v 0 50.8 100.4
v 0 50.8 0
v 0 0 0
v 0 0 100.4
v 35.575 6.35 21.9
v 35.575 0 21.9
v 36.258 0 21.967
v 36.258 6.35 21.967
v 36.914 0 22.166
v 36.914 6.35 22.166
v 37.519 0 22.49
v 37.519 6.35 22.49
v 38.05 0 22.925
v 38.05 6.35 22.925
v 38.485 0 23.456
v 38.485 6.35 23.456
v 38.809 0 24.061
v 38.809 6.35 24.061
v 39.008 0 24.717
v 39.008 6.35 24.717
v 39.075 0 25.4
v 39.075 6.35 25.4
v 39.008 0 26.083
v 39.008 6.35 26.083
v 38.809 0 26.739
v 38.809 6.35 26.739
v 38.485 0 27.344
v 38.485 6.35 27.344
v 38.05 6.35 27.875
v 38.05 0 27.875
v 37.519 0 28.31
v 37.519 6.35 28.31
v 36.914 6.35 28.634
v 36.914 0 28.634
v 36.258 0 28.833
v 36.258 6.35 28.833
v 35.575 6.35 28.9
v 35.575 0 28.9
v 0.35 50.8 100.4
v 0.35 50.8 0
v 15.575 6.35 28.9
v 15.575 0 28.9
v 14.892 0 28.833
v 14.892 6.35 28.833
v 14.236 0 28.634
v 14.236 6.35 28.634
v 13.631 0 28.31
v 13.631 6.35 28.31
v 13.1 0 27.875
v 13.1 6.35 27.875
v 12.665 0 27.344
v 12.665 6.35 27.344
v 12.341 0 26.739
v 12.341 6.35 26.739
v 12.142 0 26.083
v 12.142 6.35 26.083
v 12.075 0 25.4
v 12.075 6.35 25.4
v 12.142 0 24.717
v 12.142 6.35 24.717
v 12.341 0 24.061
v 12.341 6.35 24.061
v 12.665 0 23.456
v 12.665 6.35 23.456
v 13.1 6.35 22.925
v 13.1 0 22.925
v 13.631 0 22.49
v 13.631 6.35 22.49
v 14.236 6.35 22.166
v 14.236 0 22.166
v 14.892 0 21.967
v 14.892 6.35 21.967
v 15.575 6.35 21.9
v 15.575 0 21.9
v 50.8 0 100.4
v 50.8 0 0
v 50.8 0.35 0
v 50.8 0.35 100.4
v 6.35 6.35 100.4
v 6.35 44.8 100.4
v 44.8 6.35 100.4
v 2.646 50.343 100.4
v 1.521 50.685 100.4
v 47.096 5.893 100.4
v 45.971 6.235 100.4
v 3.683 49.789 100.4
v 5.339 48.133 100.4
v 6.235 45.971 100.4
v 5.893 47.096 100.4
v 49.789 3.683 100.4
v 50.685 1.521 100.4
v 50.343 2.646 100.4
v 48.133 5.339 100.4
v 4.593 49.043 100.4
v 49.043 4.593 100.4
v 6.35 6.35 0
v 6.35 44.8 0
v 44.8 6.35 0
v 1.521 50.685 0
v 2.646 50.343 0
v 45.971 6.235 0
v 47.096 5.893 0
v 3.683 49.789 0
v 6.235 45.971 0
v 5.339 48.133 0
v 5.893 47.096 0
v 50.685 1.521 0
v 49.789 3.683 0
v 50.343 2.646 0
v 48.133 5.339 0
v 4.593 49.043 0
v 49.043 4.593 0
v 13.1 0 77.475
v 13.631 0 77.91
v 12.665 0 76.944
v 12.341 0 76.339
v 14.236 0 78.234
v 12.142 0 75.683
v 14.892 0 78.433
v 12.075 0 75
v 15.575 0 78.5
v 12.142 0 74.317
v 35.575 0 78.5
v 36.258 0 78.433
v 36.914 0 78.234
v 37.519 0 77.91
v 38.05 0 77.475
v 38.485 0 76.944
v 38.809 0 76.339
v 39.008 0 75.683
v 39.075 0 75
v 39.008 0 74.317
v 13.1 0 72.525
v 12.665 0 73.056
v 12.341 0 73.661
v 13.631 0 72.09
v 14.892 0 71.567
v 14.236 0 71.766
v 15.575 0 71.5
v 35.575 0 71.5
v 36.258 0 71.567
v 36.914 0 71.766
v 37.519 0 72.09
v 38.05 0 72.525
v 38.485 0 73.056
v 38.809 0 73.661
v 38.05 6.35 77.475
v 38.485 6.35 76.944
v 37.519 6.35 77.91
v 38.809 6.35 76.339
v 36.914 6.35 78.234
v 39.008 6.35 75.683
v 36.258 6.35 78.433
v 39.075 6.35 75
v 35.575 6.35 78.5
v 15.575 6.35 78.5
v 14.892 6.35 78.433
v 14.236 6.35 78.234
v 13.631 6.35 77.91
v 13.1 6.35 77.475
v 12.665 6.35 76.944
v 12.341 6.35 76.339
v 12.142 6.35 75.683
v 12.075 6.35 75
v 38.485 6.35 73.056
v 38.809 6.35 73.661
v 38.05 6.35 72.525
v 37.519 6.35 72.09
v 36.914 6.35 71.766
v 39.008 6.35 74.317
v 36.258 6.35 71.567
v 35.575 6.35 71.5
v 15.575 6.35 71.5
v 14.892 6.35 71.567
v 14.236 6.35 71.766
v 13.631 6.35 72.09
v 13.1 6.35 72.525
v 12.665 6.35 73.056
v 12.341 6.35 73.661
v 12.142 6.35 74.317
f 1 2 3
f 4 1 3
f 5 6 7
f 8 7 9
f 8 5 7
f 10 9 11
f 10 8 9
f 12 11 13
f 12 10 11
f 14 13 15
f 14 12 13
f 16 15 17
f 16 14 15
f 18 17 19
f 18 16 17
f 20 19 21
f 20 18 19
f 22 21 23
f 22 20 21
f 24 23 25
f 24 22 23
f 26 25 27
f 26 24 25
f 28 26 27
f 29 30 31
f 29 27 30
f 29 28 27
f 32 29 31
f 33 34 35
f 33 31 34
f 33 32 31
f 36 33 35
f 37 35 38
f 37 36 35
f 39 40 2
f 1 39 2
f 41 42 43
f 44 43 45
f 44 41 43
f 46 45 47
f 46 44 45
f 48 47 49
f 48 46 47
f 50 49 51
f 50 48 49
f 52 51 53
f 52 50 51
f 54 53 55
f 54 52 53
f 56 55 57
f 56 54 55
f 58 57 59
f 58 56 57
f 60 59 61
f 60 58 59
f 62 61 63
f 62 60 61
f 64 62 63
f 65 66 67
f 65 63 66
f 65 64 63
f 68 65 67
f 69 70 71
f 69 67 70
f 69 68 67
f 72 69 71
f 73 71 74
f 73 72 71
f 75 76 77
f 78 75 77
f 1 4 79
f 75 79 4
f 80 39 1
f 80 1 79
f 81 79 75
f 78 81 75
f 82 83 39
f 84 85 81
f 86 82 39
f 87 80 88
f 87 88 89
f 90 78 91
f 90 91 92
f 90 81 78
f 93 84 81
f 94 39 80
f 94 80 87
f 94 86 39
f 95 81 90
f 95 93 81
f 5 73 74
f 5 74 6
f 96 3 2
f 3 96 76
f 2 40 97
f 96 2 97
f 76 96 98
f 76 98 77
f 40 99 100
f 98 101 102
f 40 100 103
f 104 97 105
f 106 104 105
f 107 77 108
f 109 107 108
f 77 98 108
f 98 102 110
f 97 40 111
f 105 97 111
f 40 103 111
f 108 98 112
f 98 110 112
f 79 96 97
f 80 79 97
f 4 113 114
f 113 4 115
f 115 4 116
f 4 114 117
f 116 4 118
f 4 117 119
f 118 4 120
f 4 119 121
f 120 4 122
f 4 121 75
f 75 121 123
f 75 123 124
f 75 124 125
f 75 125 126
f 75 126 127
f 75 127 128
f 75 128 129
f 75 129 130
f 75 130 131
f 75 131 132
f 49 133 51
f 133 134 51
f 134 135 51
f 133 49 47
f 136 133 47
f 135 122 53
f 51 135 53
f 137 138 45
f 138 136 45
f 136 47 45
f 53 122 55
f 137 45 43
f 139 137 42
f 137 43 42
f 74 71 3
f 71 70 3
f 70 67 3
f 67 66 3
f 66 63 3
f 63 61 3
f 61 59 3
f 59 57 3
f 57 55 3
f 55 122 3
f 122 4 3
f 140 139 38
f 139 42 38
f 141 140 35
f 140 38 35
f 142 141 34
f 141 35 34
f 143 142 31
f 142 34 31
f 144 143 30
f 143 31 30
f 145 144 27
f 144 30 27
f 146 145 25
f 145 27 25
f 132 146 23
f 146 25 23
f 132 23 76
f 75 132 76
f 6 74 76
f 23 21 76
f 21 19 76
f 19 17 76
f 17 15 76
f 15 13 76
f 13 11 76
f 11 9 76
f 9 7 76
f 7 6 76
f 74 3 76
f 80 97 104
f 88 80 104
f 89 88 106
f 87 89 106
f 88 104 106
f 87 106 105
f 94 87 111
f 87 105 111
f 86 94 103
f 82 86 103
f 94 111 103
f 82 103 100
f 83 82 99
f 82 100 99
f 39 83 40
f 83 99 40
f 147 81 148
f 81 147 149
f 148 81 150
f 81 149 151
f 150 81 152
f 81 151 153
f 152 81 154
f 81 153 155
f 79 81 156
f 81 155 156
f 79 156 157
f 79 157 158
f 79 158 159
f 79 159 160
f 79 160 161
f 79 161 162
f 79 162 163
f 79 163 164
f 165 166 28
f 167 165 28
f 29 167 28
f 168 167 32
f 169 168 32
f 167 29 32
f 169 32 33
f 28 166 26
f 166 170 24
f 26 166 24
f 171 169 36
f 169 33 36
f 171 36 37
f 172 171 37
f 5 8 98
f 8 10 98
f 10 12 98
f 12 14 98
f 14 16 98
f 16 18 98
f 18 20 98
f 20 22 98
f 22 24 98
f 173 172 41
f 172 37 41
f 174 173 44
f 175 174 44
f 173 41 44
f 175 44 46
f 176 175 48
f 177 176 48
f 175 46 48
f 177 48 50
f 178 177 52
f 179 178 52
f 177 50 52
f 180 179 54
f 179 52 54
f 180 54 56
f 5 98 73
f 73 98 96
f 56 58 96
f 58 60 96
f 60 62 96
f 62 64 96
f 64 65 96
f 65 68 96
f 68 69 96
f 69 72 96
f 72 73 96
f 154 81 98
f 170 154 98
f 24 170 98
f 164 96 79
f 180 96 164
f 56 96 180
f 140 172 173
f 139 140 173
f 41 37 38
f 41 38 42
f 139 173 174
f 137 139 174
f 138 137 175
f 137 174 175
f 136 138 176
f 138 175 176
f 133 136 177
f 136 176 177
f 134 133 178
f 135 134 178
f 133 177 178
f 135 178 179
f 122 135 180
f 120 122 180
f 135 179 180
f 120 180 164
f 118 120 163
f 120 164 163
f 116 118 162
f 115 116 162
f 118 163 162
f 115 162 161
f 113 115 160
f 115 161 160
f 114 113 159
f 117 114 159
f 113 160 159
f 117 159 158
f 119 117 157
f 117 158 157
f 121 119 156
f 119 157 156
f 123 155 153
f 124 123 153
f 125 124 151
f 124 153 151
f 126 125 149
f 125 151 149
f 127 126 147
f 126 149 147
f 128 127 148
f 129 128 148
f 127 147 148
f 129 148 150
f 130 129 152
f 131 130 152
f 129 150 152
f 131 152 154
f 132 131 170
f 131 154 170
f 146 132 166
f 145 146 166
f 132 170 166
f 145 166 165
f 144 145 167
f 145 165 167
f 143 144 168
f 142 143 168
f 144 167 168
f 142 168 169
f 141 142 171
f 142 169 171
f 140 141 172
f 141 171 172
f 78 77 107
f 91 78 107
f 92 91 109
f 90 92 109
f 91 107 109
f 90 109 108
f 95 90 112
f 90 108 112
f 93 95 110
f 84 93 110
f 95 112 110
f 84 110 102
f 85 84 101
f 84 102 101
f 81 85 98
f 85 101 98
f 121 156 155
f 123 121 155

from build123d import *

# Parameters (mm, degrees)
BOSS_EXTRUDE1_DEPTH = 100.4
CUT_EXTRUDE1_DEPTH  = 10


with BuildPart() as part:
    # Sketch1 → Boss-Extrude1 (new body)
    with BuildSketch(Plane.XY):
        with BuildLine():
            Line((44.8, 6.35), (12.35, 6.35))
            Line((12.35, 6.35), (6.35, 6.35))
            Line((6.35, 6.35), (6.35, 44.8))
            ThreePointArc((6.35, 44.8), (4.592640687, 49.042640687), (0.35, 50.8))
            Line((0.35, 50.8), (0, 50.8))
            Line((0, 50.8), (0, 6.35))
            Line((0, 6.35), (0, 0))
            Line((0, 0), (6.35, 0))
            Line((6.35, 0), (50.8, 0))
            Line((50.8, 0), (50.8, 0.35))
            ThreePointArc((50.8, 0.35), (49.042640687, 4.592640687), (44.8, 6.35))
        make_face()
    extrude(amount=BOSS_EXTRUDE1_DEPTH)

    # Sketch2 → Cut-Extrude1 (cut)
    with BuildSketch(Plane(origin=(0, 6.35, 0), x_dir=(1, 0, 0), z_dir=(0, 1, 0))):
        with BuildLine():
            Line((15.575, -21.9), (35.575, -21.9))
            ThreePointArc((35.575, -21.9), (39.075, -25.4), (35.575, -28.9))
            Line((35.575, -28.9), (15.575, -28.9))
            ThreePointArc((15.575, -28.9), (12.075, -25.4), (15.575, -21.9))
        make_face()
        with BuildLine():
            Line((15.575, -78.5), (35.575, -78.5))
            ThreePointArc((35.575, -78.5), (39.075, -75), (35.575, -71.5))
            Line((35.575, -71.5), (15.575, -71.5))
            ThreePointArc((15.575, -71.5), (12.075, -75), (15.575, -78.5))
        make_face()
    extrude(amount=-CUT_EXTRUDE1_DEPTH, mode=Mode.SUBTRACT)


solid = part.part
